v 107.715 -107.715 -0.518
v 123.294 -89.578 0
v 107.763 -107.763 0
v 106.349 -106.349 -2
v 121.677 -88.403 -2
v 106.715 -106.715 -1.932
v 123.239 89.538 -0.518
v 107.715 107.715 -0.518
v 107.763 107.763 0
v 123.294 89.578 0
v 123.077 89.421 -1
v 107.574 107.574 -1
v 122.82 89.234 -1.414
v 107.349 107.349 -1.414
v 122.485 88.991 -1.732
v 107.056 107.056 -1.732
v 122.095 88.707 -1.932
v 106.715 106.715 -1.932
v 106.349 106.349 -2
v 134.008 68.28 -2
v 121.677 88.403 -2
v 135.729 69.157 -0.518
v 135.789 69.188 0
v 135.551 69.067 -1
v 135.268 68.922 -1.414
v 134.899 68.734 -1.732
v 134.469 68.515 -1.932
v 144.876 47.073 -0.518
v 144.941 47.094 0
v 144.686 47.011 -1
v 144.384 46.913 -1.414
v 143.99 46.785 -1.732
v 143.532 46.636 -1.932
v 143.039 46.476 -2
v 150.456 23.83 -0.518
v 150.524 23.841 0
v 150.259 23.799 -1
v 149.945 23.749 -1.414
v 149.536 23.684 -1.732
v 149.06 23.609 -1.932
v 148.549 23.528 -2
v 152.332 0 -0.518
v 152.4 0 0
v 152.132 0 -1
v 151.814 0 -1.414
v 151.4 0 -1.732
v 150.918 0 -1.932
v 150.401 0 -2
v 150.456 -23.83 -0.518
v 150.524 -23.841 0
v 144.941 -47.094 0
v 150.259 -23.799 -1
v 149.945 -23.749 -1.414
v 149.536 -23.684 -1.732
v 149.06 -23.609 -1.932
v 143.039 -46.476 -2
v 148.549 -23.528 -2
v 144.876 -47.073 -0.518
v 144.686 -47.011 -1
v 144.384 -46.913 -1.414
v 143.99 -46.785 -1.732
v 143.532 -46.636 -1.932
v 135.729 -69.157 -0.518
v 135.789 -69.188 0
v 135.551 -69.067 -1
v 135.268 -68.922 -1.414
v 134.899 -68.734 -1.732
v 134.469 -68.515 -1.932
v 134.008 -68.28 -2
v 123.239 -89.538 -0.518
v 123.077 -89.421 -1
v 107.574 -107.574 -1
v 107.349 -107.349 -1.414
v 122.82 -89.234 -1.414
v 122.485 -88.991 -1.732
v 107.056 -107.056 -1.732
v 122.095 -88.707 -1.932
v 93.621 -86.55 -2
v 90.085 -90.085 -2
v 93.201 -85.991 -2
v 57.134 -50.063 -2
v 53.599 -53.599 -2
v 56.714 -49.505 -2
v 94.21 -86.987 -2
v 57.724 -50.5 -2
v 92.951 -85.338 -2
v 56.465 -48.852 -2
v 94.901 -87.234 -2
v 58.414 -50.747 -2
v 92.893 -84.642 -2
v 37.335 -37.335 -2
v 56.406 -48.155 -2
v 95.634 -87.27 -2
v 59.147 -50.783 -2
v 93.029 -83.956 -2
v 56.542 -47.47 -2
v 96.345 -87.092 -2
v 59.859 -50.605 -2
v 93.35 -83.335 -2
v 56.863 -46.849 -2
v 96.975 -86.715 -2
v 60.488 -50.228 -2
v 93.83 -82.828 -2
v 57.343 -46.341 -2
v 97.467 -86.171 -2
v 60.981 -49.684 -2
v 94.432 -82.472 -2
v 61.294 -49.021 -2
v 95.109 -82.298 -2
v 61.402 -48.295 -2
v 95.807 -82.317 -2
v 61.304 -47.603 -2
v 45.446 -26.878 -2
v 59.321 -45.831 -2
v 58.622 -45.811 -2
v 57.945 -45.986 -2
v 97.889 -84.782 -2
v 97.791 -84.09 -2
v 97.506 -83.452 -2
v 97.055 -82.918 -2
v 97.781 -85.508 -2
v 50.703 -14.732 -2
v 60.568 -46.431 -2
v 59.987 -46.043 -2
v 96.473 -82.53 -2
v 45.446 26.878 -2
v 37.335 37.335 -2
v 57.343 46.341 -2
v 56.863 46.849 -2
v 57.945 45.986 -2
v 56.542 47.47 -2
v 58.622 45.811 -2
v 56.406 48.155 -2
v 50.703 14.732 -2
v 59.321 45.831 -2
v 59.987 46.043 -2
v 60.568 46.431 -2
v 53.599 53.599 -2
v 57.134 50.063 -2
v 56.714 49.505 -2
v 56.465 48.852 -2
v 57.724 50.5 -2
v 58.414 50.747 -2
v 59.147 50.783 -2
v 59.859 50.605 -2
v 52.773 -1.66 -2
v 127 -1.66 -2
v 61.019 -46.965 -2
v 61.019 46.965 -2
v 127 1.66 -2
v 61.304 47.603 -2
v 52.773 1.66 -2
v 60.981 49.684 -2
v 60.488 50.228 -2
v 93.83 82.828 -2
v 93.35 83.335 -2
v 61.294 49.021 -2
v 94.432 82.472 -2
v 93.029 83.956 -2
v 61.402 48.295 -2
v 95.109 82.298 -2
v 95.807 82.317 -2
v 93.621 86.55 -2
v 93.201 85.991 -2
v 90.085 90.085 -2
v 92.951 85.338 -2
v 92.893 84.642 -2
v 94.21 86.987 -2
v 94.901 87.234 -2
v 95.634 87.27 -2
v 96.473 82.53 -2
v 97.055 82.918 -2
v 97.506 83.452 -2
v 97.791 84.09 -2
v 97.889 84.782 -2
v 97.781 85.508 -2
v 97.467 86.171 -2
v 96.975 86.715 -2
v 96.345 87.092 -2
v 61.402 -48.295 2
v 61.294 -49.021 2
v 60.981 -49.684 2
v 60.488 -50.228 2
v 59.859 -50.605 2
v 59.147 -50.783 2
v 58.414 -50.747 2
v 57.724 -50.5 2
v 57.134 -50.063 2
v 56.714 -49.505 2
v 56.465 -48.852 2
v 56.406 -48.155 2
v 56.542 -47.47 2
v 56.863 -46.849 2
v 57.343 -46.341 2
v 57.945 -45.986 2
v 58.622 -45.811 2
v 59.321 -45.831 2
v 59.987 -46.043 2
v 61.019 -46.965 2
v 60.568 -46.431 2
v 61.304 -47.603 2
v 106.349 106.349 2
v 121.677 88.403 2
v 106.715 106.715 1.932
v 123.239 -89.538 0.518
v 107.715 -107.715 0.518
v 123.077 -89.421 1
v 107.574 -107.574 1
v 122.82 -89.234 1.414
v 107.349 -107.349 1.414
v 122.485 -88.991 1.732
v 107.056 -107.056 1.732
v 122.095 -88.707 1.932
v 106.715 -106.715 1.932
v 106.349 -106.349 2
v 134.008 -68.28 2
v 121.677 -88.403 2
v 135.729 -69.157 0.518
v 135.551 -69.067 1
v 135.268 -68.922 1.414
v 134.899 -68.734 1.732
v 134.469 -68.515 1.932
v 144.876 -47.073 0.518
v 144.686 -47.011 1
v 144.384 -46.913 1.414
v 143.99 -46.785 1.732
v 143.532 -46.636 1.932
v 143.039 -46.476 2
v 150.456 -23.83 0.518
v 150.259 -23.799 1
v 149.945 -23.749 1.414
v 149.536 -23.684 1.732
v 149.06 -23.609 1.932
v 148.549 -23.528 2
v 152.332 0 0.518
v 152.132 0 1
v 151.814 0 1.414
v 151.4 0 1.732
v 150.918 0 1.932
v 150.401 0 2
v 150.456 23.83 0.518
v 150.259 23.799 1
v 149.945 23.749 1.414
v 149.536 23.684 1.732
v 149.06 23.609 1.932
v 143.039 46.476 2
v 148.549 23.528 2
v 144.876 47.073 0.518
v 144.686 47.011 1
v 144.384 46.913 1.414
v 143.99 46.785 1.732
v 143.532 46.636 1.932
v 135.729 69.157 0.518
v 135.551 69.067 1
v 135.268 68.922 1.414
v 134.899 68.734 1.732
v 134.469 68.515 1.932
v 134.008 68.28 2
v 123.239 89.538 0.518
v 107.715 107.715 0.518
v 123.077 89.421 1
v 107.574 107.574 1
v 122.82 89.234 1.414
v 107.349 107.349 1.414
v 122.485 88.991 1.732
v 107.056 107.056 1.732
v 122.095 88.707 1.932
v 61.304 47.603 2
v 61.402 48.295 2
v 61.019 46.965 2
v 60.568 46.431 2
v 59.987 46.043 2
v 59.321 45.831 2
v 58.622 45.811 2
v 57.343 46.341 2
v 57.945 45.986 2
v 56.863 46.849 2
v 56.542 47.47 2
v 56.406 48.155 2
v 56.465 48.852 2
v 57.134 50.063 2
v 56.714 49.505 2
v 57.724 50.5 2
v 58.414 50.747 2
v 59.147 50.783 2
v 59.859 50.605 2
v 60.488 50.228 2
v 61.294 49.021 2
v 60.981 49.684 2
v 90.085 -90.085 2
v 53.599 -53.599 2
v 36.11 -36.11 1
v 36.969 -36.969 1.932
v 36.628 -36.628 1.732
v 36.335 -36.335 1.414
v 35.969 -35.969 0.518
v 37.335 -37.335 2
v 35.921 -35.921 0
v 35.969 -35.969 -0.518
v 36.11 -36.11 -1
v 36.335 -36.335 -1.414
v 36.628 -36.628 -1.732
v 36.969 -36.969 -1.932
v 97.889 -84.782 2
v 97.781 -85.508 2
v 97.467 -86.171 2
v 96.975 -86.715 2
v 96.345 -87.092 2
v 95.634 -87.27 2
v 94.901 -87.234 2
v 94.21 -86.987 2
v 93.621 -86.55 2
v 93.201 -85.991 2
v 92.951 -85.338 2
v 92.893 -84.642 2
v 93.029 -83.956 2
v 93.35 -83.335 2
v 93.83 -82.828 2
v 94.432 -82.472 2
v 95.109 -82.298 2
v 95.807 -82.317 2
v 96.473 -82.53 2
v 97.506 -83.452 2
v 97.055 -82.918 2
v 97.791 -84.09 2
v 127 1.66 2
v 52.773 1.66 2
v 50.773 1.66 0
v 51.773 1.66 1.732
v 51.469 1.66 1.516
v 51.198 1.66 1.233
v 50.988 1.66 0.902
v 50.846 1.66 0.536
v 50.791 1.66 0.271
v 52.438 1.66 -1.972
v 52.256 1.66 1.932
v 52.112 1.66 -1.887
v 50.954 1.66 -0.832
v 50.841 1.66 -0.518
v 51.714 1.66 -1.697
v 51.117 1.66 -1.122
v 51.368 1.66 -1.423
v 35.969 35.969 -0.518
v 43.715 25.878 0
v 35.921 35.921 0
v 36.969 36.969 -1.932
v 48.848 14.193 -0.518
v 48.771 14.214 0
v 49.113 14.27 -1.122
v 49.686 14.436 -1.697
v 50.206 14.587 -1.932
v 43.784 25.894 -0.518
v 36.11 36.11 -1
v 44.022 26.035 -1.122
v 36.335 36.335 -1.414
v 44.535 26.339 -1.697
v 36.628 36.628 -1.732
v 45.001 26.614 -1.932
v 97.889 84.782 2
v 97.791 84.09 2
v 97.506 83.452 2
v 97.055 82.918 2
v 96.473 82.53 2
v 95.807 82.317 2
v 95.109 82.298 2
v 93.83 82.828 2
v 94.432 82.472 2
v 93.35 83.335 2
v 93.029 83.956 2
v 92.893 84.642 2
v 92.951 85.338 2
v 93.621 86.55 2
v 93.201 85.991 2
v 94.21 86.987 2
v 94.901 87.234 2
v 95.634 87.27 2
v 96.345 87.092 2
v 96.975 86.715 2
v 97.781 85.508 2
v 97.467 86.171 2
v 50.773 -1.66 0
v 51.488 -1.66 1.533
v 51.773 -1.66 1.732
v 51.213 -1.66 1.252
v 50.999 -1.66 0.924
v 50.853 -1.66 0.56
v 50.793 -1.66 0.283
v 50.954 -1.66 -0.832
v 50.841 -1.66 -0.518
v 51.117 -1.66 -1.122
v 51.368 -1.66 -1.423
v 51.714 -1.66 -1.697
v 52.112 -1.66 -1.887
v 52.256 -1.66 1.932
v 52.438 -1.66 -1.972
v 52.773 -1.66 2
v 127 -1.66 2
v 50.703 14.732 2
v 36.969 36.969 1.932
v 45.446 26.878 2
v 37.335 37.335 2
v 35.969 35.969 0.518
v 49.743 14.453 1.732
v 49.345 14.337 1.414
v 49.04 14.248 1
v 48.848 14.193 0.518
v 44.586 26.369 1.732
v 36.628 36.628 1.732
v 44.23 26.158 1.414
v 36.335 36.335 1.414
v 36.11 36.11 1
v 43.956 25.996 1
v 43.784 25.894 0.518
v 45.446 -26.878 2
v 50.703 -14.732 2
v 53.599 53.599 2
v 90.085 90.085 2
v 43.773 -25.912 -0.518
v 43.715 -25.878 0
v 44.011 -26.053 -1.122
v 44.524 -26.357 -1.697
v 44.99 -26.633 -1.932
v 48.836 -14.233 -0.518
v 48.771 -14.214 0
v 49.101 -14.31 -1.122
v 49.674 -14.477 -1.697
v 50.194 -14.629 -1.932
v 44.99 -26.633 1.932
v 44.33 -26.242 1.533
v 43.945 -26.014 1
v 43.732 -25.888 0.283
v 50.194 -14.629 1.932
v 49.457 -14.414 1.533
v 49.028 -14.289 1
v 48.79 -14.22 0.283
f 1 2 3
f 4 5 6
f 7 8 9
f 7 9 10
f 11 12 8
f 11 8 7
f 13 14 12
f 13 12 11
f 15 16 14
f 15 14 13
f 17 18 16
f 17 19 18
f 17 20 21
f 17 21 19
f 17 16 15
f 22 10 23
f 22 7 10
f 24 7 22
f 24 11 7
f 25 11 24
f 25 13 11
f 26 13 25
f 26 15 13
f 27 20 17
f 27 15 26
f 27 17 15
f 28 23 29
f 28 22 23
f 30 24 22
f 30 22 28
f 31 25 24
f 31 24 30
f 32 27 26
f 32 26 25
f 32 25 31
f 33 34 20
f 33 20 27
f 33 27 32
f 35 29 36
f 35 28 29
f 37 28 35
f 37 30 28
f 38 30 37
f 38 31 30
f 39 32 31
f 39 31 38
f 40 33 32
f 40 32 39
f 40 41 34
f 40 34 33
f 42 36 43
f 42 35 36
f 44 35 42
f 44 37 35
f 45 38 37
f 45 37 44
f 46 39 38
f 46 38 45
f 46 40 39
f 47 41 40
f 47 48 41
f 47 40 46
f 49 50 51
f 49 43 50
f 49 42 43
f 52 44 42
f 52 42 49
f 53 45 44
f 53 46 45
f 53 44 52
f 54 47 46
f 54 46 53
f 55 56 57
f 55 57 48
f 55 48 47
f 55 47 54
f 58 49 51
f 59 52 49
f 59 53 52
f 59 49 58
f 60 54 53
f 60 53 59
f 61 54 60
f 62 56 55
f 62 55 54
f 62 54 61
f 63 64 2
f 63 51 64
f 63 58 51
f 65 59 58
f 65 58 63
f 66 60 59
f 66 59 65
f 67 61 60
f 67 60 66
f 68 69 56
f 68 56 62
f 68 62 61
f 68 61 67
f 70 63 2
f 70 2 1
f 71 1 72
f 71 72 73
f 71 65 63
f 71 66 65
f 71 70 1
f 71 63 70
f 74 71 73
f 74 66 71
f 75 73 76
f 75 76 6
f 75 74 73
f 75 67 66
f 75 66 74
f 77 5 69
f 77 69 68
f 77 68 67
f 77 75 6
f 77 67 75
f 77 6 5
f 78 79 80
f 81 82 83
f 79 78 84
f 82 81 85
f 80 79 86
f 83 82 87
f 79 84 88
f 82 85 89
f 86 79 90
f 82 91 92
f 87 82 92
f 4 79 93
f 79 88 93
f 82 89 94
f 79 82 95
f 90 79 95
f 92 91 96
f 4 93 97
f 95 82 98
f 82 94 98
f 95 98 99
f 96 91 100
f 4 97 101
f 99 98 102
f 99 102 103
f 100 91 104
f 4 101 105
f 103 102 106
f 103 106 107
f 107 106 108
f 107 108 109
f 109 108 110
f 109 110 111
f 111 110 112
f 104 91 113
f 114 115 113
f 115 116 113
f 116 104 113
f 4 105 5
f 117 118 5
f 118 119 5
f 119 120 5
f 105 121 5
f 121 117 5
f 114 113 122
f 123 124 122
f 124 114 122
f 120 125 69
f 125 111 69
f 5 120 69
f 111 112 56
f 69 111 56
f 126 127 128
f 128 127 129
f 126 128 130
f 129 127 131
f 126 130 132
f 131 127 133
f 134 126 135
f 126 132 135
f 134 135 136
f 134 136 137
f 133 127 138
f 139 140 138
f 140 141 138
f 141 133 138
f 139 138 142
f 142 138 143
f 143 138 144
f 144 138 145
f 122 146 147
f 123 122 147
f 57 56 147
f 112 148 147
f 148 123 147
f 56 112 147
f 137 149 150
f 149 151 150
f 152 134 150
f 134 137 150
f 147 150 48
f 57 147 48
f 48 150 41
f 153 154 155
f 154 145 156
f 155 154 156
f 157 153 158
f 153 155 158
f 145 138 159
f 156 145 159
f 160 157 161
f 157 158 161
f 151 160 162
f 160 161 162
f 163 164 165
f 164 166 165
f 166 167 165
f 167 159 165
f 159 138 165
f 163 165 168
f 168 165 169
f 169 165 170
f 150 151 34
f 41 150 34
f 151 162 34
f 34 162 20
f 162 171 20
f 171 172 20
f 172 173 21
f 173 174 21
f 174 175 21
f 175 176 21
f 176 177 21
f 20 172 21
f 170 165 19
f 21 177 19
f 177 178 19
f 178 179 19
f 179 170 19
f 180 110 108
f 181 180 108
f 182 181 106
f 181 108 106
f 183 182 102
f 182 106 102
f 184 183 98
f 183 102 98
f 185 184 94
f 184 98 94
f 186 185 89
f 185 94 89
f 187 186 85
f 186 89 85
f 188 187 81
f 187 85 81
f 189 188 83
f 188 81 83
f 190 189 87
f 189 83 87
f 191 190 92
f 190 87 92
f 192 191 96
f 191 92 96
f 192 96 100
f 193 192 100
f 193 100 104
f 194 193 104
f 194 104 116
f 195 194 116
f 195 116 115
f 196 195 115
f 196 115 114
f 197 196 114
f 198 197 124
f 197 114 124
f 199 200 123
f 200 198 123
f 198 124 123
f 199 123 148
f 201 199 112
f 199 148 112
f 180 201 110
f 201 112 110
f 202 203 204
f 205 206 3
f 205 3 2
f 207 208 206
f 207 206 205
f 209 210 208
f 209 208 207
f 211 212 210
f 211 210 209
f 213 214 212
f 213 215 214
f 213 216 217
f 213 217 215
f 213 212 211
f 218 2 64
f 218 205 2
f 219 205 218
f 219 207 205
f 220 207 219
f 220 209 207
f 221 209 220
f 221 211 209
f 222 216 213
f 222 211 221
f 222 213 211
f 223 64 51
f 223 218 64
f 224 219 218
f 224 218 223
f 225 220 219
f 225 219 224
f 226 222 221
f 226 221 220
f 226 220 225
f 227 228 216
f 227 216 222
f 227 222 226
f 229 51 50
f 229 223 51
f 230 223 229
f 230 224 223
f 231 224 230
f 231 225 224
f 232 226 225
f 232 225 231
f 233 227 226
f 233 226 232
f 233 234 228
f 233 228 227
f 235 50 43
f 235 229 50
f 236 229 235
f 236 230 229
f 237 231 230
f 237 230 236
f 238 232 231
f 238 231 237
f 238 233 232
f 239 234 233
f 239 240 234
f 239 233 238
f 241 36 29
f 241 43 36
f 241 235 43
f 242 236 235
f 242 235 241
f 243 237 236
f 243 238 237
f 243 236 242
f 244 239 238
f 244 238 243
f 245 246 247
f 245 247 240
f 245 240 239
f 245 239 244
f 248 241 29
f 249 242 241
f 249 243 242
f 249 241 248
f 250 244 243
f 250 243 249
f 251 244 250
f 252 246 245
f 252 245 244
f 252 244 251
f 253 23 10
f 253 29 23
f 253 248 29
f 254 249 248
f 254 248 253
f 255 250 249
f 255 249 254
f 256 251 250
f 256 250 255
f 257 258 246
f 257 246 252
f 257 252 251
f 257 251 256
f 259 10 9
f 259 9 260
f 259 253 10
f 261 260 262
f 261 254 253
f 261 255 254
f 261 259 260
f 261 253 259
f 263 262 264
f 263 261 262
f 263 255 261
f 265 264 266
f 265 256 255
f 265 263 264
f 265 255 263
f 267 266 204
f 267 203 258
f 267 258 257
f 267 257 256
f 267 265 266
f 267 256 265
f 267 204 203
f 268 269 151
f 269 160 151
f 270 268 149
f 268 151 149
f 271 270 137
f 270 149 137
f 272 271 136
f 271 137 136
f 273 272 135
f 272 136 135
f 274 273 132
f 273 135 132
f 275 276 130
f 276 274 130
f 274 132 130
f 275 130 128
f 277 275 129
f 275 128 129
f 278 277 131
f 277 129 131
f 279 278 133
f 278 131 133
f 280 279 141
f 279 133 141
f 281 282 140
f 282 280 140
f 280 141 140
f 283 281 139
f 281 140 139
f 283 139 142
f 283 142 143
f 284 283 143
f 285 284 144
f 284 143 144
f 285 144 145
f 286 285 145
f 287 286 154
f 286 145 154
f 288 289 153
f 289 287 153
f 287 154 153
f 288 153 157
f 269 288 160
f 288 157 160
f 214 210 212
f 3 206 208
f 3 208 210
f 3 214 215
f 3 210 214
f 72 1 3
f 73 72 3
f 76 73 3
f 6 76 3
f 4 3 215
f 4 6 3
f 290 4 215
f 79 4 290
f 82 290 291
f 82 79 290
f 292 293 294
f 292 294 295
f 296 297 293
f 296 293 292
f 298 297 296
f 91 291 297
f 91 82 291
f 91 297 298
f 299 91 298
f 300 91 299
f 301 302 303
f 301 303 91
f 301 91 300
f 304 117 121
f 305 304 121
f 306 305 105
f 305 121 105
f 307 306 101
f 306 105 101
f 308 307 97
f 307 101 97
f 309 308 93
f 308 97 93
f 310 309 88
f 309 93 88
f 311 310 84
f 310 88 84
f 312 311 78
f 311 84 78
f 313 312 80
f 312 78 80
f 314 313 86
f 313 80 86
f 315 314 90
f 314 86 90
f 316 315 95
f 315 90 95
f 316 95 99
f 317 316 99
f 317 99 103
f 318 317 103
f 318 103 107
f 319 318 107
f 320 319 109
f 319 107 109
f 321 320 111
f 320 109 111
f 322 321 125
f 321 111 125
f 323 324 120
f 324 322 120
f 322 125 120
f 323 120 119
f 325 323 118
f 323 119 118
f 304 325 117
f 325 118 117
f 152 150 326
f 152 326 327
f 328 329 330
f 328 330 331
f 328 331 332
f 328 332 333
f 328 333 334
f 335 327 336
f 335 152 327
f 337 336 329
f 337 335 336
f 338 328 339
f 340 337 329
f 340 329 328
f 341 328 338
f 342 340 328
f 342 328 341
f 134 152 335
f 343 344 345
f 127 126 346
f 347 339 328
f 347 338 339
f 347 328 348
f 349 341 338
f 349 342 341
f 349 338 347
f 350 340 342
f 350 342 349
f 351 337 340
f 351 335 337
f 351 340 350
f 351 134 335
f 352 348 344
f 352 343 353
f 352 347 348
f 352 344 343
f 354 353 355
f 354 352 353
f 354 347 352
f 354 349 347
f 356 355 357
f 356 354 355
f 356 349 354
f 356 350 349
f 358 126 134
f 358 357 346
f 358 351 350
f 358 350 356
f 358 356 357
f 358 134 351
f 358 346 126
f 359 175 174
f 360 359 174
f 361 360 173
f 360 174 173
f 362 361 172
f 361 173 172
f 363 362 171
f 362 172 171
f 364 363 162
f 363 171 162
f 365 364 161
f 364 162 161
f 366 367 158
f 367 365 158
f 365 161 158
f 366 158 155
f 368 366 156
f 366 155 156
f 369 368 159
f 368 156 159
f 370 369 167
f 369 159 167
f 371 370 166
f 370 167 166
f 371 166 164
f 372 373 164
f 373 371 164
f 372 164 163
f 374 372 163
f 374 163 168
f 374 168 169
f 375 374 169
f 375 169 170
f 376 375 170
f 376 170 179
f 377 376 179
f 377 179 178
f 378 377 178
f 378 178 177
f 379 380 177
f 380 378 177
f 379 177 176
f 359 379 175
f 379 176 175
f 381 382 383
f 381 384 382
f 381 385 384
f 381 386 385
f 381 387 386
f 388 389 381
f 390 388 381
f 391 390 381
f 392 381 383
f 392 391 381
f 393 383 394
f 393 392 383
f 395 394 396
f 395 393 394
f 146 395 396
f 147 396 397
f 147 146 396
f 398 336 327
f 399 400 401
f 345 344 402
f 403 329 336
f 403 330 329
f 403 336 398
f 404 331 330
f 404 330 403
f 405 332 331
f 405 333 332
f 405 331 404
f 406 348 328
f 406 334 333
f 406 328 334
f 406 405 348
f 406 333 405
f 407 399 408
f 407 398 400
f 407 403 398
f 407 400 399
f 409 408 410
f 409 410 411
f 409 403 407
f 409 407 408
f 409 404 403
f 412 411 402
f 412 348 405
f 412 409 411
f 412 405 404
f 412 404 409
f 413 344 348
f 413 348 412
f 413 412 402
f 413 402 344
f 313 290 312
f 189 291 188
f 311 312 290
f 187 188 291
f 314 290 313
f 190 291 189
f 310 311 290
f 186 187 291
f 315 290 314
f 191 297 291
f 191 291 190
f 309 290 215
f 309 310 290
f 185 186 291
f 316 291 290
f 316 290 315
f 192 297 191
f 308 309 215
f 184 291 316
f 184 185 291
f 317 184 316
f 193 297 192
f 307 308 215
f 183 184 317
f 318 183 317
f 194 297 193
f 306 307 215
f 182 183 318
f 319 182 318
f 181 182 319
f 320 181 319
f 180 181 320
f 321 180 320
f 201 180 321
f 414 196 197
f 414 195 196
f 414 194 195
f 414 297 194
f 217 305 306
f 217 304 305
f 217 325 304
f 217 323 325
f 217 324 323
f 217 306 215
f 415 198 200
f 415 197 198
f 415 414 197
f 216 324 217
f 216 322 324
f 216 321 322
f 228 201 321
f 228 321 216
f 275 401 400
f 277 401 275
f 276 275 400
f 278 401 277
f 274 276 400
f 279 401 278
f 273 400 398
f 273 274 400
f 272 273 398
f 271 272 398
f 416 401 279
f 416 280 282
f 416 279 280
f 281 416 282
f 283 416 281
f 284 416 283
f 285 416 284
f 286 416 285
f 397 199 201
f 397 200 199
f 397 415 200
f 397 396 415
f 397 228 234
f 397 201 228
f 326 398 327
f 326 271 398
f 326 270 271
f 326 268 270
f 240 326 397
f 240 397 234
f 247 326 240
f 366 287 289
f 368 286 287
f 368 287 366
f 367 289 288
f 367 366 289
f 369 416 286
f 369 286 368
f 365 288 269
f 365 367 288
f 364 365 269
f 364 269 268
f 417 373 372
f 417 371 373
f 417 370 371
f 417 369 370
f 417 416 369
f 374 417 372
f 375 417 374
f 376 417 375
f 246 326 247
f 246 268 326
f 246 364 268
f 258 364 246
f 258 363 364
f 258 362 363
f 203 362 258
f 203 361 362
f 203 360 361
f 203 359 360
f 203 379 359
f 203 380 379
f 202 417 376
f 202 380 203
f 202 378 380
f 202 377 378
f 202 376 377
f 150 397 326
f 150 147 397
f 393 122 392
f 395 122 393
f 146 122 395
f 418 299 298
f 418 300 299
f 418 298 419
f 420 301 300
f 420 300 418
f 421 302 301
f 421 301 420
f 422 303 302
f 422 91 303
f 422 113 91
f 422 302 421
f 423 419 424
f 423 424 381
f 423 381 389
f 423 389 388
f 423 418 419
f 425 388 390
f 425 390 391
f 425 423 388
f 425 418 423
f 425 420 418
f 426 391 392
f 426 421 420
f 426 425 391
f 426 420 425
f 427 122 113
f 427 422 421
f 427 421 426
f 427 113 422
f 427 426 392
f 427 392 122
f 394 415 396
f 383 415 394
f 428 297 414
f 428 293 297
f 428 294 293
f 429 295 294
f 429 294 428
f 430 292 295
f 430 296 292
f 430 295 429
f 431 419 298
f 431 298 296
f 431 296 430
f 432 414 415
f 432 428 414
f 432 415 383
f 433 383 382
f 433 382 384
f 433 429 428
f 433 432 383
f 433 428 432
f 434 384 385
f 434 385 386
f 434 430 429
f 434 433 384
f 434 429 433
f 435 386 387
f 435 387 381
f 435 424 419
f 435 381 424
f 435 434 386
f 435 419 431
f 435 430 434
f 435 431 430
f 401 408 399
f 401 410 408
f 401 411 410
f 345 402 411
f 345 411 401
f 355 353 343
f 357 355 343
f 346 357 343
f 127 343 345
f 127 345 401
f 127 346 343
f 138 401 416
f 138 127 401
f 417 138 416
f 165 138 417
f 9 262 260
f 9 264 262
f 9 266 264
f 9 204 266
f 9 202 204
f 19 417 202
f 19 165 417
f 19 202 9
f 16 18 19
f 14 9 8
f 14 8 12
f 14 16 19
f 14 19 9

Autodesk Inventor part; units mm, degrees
ref_plane "YZ Plane" through (0, 0, 0) normal (1, 0, 0) x (0, 1, 0)
ref_plane "XZ Plane" through (0, 0, 0) normal (0, 1, 0) x (-1, 0, 0)
ref_plane "XY Plane" through (0, 0, 0) normal (0, 0, 1) x (1, 0, 0)
sketch "Sketch1" plane through (0, 0, 0) normal (0, 0, 1) x (1, 0, 0)
  arc A0 (107.7631, -107.7631) -> (-107.7631, 107.7631) centre (0, 0) ccw
  line L0 (152.4, 0) -> (127, 0)
  line L1 (127, -1.66) -> (127, 1.66)
  line L2 (127, 1.66) -> (50.7729, 1.66)
  line L3 (50.7729, -1.66) -> (127, -1.66)
  line L4 (-64.9376, 109.1552) -> (-26.824, 43.1406)
  line L5 (-23.9488, 44.8006) -> (-62.0624, 110.8152)
  line L6 (-1.66, 127) -> (-1.66, 50.7729)
  line L7 (1.66, 50.7729) -> (1.66, 127)
  line L8 (1.66, 127) -> (-1.66, 127)
  line L9 (-62.0624, 110.8152) -> (-64.9376, 109.1552)
  line L10 (35.921, 35.921) -> (107.7631, 107.7631)
  line L11 (0, 0) -> (152.4, 0) construction
  line L12 (0, 0) -> (152.4, 0) construction
  line L13 (107.7631, -107.7631) -> (35.921, -35.921)
  line L14 (-35.921, 35.921) -> (-107.7631, 107.7631)
  arc A1 (-26.824, 43.1406) -> (-35.921, 35.921) centre (0, 0) ccw
  arc A2 (35.921, -35.921) -> (1.66, 50.7729) centre (0, 0) ccw
  arc A3 (-1.66, 50.7729) -> (-23.9488, 44.8006) centre (0, 0) ccw
  line L15 (35.921, 35.921) -> (53.5987, 53.5987)
  line L16 (107.7631, 107.7631) -> (90.0854, 90.0854)
  circle A4 centre (53.5987, 53.5987) radius 15
  line L17 (53.5987, 53.5987) -> (58.902, 48.2954)
  line L18 (53.5987, 53.5987) -> (48.2954, 58.902)
  circle A5 centre (48.2954, 58.902) radius 2.5
  circle A6 centre (58.902, 48.2954) radius 2.5
  circle A7 centre (90.0854, 90.0854) radius 15
  line L19 (90.0854, 90.0854) -> (95.3887, 84.7821)
  line L20 (90.0854, 90.0854) -> (84.7821, 95.3887)
  circle A8 centre (84.7821, 95.3887) radius 2.5
  circle A9 centre (95.3887, 84.7821) radius 2.5
  line L21 (-90.0854, 90.0854) -> (-84.7821, 95.3887)
  circle A10 centre (-84.7821, 95.3887) radius 2.5
  circle A11 centre (-90.0854, 90.0854) radius 15
  line L22 (-90.0854, 90.0854) -> (-95.3887, 84.7821)
  circle A12 centre (-95.3887, 84.7821) radius 2.5
  circle A13 centre (-58.902, 48.2954) radius 2.5
  circle A14 centre (-53.5987, 53.5987) radius 15
  line L23 (-53.5987, 53.5987) -> (-58.902, 48.2954)
  circle A15 centre (-48.2954, 58.902) radius 2.5
  line L24 (-53.5987, 53.5987) -> (-48.2954, 58.902)
  line L25 (90.0854, -90.0854) -> (84.7821, -95.3887)
  circle A16 centre (84.7821, -95.3887) radius 2.5
  circle A17 centre (90.0854, -90.0854) radius 15
  line L26 (90.0854, -90.0854) -> (95.3887, -84.7821)
  circle A18 centre (95.3887, -84.7821) radius 2.5
  circle A19 centre (58.902, -48.2954) radius 2.5
  circle A20 centre (53.5987, -53.5987) radius 15
  line L27 (53.5987, -53.5987) -> (58.902, -48.2954)
  circle A21 centre (48.2954, -58.902) radius 2.5
  line L28 (53.5987, -53.5987) -> (48.2954, -58.902)
  point P0 (50.8, 0)
  dimension "d2" = 25.4
  dimension "d3" = 3.32
  dimension "d10" = 45
  dimension "d12" = 25
  dimension "d13" = 25
  dimension "d14" = 30
  dimension "d15" = 7.5
  dimension "d16" = 7.5
  dimension "d17" = 5
  dimension "d18" = 5
  dimension "d19" = 30
  dimension "d20" = 7.5
  dimension "d21" = 7.5
  dimension "d22" = 5
  dimension "d23" = 5
extrude "Extrusion5" add sketch "Sketch1" along normal mid plane 4 contours L13 A17 A20 A2 L3 L1 L0 A0 | L0 L1 L2 A2 L10 A4 A7 A0 | L13 A17 | A7 L10 | L13 A20 | A4 L10 picked at (87.4853, -84.823) picked at (87.4853, 84.823) picked at (50.9986, -48.3363) picked at (50.9986, 48.3363)
fillet "Fillet2" radius 2 6 edges at (46.6091, -20.2046, -2) (46.6091, -20.2046, 2) (46.6091, 20.2046, -2) (46.6091, 20.2046, 2) (152.4, 0, -2) (152.4, 0, 2)
properties part number "fin_alignment_rig_part2"
